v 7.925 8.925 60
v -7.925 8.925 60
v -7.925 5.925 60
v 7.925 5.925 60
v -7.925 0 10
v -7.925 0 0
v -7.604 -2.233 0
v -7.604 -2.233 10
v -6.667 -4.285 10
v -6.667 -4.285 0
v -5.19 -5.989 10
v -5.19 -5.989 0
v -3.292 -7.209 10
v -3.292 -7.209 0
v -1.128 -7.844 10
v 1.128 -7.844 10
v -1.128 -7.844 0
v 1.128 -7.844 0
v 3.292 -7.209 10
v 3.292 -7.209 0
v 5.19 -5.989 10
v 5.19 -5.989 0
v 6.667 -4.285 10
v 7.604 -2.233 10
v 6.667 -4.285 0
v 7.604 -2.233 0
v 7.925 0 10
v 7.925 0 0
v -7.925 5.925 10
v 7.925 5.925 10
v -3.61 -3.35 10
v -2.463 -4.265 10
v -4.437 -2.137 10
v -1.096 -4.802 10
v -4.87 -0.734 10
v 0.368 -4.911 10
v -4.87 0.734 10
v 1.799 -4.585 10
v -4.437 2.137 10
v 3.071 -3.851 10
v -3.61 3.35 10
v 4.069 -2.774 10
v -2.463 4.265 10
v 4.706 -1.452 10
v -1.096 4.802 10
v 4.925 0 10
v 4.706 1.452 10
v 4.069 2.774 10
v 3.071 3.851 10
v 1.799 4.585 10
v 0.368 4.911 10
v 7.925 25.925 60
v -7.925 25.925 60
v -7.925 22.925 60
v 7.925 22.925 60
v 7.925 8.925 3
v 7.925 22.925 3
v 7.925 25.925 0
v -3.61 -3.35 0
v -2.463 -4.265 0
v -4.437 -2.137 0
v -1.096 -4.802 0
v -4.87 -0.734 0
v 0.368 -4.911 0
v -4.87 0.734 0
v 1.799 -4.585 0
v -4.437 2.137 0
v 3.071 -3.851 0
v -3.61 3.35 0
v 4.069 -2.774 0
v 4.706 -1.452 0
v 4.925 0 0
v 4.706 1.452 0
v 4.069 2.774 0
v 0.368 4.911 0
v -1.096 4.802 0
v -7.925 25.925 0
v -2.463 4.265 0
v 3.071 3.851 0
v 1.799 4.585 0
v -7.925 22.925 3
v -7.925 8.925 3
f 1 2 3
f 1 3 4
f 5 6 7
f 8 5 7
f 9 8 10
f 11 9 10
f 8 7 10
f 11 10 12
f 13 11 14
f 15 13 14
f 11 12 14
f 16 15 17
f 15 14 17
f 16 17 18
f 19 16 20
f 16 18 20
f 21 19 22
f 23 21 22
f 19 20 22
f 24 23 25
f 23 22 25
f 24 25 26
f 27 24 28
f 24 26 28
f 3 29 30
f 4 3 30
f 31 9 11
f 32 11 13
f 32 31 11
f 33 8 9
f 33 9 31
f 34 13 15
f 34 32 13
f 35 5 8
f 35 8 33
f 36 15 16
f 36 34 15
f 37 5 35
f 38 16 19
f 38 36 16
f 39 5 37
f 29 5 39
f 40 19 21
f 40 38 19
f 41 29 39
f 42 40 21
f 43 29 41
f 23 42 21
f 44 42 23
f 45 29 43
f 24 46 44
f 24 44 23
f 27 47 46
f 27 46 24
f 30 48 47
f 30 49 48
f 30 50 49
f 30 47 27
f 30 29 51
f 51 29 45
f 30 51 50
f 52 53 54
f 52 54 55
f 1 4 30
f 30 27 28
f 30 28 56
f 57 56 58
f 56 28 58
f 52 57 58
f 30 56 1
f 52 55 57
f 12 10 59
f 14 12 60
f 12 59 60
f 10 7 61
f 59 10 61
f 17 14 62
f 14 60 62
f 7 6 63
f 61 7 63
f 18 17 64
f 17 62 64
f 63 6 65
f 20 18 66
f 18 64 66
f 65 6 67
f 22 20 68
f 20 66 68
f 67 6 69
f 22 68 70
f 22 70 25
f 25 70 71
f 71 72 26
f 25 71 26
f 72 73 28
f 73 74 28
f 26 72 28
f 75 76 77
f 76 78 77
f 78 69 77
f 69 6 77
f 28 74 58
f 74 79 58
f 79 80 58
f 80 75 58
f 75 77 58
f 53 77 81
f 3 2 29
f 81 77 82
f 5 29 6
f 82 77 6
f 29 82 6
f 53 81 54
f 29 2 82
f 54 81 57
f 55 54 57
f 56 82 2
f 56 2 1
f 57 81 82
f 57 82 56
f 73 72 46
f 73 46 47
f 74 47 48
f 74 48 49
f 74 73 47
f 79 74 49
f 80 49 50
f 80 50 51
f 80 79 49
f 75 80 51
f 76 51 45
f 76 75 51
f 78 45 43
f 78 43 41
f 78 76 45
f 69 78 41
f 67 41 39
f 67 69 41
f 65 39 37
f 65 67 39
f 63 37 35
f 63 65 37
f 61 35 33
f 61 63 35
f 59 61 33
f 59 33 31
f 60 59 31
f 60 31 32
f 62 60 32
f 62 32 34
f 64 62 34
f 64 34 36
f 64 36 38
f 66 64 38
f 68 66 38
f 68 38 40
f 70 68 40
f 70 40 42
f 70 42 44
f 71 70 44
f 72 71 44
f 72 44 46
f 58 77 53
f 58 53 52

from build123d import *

# Parameters (mm, degrees)
F0_R     = 4.925
F0_W     = 15.85
F0_H     = 3
F0_H_2   = 14
F1_DEPTH = 3
F2_DEPTH = 60
F3_DEPTH = 10


with BuildPart() as f1:
    # F0 (on Top) → F1 (new body)
    with BuildSketch(Plane.XY):
        with BuildLine():
            Line((-7.925, 5.925), (-7.925, 0))
            ThreePointArc((-7.925, 0), (0, -7.925), (7.925, 0))
            Line((7.925, 0), (7.925, 5.925))
            Line((7.925, 5.925), (-7.925, 5.925))
        make_face()
        Circle(F0_R, mode=Mode.SUBTRACT)
        with Locations((0, 7.425)):
            Rectangle(F0_W, F0_H)
        with Locations((0, 15.925)):
            Rectangle(F0_W, F0_H_2)
        with Locations((0, 24.425)):
            Rectangle(F0_W, F0_H)
    extrude(amount=F1_DEPTH)

    # F0 (on Top) → F2 (join)
    with BuildSketch(Plane.XY):
        with Locations((0, 7.425)):
            Rectangle(F0_W, F0_H)
        with Locations((0, 24.425)):
            Rectangle(F0_W, F0_H)
    extrude(amount=F2_DEPTH)

    # F0 (on Top) → F3 (join)
    with BuildSketch(Plane.XY):
        with BuildLine():
            Line((-7.925, 5.925), (-7.925, 0))
            ThreePointArc((-7.925, 0), (0, -7.925), (7.925, 0))
            Line((7.925, 0), (7.925, 5.925))
            Line((7.925, 5.925), (-7.925, 5.925))
        make_face()
        Circle(F0_R, mode=Mode.SUBTRACT)
    extrude(amount=F3_DEPTH)


solid = f1.part
